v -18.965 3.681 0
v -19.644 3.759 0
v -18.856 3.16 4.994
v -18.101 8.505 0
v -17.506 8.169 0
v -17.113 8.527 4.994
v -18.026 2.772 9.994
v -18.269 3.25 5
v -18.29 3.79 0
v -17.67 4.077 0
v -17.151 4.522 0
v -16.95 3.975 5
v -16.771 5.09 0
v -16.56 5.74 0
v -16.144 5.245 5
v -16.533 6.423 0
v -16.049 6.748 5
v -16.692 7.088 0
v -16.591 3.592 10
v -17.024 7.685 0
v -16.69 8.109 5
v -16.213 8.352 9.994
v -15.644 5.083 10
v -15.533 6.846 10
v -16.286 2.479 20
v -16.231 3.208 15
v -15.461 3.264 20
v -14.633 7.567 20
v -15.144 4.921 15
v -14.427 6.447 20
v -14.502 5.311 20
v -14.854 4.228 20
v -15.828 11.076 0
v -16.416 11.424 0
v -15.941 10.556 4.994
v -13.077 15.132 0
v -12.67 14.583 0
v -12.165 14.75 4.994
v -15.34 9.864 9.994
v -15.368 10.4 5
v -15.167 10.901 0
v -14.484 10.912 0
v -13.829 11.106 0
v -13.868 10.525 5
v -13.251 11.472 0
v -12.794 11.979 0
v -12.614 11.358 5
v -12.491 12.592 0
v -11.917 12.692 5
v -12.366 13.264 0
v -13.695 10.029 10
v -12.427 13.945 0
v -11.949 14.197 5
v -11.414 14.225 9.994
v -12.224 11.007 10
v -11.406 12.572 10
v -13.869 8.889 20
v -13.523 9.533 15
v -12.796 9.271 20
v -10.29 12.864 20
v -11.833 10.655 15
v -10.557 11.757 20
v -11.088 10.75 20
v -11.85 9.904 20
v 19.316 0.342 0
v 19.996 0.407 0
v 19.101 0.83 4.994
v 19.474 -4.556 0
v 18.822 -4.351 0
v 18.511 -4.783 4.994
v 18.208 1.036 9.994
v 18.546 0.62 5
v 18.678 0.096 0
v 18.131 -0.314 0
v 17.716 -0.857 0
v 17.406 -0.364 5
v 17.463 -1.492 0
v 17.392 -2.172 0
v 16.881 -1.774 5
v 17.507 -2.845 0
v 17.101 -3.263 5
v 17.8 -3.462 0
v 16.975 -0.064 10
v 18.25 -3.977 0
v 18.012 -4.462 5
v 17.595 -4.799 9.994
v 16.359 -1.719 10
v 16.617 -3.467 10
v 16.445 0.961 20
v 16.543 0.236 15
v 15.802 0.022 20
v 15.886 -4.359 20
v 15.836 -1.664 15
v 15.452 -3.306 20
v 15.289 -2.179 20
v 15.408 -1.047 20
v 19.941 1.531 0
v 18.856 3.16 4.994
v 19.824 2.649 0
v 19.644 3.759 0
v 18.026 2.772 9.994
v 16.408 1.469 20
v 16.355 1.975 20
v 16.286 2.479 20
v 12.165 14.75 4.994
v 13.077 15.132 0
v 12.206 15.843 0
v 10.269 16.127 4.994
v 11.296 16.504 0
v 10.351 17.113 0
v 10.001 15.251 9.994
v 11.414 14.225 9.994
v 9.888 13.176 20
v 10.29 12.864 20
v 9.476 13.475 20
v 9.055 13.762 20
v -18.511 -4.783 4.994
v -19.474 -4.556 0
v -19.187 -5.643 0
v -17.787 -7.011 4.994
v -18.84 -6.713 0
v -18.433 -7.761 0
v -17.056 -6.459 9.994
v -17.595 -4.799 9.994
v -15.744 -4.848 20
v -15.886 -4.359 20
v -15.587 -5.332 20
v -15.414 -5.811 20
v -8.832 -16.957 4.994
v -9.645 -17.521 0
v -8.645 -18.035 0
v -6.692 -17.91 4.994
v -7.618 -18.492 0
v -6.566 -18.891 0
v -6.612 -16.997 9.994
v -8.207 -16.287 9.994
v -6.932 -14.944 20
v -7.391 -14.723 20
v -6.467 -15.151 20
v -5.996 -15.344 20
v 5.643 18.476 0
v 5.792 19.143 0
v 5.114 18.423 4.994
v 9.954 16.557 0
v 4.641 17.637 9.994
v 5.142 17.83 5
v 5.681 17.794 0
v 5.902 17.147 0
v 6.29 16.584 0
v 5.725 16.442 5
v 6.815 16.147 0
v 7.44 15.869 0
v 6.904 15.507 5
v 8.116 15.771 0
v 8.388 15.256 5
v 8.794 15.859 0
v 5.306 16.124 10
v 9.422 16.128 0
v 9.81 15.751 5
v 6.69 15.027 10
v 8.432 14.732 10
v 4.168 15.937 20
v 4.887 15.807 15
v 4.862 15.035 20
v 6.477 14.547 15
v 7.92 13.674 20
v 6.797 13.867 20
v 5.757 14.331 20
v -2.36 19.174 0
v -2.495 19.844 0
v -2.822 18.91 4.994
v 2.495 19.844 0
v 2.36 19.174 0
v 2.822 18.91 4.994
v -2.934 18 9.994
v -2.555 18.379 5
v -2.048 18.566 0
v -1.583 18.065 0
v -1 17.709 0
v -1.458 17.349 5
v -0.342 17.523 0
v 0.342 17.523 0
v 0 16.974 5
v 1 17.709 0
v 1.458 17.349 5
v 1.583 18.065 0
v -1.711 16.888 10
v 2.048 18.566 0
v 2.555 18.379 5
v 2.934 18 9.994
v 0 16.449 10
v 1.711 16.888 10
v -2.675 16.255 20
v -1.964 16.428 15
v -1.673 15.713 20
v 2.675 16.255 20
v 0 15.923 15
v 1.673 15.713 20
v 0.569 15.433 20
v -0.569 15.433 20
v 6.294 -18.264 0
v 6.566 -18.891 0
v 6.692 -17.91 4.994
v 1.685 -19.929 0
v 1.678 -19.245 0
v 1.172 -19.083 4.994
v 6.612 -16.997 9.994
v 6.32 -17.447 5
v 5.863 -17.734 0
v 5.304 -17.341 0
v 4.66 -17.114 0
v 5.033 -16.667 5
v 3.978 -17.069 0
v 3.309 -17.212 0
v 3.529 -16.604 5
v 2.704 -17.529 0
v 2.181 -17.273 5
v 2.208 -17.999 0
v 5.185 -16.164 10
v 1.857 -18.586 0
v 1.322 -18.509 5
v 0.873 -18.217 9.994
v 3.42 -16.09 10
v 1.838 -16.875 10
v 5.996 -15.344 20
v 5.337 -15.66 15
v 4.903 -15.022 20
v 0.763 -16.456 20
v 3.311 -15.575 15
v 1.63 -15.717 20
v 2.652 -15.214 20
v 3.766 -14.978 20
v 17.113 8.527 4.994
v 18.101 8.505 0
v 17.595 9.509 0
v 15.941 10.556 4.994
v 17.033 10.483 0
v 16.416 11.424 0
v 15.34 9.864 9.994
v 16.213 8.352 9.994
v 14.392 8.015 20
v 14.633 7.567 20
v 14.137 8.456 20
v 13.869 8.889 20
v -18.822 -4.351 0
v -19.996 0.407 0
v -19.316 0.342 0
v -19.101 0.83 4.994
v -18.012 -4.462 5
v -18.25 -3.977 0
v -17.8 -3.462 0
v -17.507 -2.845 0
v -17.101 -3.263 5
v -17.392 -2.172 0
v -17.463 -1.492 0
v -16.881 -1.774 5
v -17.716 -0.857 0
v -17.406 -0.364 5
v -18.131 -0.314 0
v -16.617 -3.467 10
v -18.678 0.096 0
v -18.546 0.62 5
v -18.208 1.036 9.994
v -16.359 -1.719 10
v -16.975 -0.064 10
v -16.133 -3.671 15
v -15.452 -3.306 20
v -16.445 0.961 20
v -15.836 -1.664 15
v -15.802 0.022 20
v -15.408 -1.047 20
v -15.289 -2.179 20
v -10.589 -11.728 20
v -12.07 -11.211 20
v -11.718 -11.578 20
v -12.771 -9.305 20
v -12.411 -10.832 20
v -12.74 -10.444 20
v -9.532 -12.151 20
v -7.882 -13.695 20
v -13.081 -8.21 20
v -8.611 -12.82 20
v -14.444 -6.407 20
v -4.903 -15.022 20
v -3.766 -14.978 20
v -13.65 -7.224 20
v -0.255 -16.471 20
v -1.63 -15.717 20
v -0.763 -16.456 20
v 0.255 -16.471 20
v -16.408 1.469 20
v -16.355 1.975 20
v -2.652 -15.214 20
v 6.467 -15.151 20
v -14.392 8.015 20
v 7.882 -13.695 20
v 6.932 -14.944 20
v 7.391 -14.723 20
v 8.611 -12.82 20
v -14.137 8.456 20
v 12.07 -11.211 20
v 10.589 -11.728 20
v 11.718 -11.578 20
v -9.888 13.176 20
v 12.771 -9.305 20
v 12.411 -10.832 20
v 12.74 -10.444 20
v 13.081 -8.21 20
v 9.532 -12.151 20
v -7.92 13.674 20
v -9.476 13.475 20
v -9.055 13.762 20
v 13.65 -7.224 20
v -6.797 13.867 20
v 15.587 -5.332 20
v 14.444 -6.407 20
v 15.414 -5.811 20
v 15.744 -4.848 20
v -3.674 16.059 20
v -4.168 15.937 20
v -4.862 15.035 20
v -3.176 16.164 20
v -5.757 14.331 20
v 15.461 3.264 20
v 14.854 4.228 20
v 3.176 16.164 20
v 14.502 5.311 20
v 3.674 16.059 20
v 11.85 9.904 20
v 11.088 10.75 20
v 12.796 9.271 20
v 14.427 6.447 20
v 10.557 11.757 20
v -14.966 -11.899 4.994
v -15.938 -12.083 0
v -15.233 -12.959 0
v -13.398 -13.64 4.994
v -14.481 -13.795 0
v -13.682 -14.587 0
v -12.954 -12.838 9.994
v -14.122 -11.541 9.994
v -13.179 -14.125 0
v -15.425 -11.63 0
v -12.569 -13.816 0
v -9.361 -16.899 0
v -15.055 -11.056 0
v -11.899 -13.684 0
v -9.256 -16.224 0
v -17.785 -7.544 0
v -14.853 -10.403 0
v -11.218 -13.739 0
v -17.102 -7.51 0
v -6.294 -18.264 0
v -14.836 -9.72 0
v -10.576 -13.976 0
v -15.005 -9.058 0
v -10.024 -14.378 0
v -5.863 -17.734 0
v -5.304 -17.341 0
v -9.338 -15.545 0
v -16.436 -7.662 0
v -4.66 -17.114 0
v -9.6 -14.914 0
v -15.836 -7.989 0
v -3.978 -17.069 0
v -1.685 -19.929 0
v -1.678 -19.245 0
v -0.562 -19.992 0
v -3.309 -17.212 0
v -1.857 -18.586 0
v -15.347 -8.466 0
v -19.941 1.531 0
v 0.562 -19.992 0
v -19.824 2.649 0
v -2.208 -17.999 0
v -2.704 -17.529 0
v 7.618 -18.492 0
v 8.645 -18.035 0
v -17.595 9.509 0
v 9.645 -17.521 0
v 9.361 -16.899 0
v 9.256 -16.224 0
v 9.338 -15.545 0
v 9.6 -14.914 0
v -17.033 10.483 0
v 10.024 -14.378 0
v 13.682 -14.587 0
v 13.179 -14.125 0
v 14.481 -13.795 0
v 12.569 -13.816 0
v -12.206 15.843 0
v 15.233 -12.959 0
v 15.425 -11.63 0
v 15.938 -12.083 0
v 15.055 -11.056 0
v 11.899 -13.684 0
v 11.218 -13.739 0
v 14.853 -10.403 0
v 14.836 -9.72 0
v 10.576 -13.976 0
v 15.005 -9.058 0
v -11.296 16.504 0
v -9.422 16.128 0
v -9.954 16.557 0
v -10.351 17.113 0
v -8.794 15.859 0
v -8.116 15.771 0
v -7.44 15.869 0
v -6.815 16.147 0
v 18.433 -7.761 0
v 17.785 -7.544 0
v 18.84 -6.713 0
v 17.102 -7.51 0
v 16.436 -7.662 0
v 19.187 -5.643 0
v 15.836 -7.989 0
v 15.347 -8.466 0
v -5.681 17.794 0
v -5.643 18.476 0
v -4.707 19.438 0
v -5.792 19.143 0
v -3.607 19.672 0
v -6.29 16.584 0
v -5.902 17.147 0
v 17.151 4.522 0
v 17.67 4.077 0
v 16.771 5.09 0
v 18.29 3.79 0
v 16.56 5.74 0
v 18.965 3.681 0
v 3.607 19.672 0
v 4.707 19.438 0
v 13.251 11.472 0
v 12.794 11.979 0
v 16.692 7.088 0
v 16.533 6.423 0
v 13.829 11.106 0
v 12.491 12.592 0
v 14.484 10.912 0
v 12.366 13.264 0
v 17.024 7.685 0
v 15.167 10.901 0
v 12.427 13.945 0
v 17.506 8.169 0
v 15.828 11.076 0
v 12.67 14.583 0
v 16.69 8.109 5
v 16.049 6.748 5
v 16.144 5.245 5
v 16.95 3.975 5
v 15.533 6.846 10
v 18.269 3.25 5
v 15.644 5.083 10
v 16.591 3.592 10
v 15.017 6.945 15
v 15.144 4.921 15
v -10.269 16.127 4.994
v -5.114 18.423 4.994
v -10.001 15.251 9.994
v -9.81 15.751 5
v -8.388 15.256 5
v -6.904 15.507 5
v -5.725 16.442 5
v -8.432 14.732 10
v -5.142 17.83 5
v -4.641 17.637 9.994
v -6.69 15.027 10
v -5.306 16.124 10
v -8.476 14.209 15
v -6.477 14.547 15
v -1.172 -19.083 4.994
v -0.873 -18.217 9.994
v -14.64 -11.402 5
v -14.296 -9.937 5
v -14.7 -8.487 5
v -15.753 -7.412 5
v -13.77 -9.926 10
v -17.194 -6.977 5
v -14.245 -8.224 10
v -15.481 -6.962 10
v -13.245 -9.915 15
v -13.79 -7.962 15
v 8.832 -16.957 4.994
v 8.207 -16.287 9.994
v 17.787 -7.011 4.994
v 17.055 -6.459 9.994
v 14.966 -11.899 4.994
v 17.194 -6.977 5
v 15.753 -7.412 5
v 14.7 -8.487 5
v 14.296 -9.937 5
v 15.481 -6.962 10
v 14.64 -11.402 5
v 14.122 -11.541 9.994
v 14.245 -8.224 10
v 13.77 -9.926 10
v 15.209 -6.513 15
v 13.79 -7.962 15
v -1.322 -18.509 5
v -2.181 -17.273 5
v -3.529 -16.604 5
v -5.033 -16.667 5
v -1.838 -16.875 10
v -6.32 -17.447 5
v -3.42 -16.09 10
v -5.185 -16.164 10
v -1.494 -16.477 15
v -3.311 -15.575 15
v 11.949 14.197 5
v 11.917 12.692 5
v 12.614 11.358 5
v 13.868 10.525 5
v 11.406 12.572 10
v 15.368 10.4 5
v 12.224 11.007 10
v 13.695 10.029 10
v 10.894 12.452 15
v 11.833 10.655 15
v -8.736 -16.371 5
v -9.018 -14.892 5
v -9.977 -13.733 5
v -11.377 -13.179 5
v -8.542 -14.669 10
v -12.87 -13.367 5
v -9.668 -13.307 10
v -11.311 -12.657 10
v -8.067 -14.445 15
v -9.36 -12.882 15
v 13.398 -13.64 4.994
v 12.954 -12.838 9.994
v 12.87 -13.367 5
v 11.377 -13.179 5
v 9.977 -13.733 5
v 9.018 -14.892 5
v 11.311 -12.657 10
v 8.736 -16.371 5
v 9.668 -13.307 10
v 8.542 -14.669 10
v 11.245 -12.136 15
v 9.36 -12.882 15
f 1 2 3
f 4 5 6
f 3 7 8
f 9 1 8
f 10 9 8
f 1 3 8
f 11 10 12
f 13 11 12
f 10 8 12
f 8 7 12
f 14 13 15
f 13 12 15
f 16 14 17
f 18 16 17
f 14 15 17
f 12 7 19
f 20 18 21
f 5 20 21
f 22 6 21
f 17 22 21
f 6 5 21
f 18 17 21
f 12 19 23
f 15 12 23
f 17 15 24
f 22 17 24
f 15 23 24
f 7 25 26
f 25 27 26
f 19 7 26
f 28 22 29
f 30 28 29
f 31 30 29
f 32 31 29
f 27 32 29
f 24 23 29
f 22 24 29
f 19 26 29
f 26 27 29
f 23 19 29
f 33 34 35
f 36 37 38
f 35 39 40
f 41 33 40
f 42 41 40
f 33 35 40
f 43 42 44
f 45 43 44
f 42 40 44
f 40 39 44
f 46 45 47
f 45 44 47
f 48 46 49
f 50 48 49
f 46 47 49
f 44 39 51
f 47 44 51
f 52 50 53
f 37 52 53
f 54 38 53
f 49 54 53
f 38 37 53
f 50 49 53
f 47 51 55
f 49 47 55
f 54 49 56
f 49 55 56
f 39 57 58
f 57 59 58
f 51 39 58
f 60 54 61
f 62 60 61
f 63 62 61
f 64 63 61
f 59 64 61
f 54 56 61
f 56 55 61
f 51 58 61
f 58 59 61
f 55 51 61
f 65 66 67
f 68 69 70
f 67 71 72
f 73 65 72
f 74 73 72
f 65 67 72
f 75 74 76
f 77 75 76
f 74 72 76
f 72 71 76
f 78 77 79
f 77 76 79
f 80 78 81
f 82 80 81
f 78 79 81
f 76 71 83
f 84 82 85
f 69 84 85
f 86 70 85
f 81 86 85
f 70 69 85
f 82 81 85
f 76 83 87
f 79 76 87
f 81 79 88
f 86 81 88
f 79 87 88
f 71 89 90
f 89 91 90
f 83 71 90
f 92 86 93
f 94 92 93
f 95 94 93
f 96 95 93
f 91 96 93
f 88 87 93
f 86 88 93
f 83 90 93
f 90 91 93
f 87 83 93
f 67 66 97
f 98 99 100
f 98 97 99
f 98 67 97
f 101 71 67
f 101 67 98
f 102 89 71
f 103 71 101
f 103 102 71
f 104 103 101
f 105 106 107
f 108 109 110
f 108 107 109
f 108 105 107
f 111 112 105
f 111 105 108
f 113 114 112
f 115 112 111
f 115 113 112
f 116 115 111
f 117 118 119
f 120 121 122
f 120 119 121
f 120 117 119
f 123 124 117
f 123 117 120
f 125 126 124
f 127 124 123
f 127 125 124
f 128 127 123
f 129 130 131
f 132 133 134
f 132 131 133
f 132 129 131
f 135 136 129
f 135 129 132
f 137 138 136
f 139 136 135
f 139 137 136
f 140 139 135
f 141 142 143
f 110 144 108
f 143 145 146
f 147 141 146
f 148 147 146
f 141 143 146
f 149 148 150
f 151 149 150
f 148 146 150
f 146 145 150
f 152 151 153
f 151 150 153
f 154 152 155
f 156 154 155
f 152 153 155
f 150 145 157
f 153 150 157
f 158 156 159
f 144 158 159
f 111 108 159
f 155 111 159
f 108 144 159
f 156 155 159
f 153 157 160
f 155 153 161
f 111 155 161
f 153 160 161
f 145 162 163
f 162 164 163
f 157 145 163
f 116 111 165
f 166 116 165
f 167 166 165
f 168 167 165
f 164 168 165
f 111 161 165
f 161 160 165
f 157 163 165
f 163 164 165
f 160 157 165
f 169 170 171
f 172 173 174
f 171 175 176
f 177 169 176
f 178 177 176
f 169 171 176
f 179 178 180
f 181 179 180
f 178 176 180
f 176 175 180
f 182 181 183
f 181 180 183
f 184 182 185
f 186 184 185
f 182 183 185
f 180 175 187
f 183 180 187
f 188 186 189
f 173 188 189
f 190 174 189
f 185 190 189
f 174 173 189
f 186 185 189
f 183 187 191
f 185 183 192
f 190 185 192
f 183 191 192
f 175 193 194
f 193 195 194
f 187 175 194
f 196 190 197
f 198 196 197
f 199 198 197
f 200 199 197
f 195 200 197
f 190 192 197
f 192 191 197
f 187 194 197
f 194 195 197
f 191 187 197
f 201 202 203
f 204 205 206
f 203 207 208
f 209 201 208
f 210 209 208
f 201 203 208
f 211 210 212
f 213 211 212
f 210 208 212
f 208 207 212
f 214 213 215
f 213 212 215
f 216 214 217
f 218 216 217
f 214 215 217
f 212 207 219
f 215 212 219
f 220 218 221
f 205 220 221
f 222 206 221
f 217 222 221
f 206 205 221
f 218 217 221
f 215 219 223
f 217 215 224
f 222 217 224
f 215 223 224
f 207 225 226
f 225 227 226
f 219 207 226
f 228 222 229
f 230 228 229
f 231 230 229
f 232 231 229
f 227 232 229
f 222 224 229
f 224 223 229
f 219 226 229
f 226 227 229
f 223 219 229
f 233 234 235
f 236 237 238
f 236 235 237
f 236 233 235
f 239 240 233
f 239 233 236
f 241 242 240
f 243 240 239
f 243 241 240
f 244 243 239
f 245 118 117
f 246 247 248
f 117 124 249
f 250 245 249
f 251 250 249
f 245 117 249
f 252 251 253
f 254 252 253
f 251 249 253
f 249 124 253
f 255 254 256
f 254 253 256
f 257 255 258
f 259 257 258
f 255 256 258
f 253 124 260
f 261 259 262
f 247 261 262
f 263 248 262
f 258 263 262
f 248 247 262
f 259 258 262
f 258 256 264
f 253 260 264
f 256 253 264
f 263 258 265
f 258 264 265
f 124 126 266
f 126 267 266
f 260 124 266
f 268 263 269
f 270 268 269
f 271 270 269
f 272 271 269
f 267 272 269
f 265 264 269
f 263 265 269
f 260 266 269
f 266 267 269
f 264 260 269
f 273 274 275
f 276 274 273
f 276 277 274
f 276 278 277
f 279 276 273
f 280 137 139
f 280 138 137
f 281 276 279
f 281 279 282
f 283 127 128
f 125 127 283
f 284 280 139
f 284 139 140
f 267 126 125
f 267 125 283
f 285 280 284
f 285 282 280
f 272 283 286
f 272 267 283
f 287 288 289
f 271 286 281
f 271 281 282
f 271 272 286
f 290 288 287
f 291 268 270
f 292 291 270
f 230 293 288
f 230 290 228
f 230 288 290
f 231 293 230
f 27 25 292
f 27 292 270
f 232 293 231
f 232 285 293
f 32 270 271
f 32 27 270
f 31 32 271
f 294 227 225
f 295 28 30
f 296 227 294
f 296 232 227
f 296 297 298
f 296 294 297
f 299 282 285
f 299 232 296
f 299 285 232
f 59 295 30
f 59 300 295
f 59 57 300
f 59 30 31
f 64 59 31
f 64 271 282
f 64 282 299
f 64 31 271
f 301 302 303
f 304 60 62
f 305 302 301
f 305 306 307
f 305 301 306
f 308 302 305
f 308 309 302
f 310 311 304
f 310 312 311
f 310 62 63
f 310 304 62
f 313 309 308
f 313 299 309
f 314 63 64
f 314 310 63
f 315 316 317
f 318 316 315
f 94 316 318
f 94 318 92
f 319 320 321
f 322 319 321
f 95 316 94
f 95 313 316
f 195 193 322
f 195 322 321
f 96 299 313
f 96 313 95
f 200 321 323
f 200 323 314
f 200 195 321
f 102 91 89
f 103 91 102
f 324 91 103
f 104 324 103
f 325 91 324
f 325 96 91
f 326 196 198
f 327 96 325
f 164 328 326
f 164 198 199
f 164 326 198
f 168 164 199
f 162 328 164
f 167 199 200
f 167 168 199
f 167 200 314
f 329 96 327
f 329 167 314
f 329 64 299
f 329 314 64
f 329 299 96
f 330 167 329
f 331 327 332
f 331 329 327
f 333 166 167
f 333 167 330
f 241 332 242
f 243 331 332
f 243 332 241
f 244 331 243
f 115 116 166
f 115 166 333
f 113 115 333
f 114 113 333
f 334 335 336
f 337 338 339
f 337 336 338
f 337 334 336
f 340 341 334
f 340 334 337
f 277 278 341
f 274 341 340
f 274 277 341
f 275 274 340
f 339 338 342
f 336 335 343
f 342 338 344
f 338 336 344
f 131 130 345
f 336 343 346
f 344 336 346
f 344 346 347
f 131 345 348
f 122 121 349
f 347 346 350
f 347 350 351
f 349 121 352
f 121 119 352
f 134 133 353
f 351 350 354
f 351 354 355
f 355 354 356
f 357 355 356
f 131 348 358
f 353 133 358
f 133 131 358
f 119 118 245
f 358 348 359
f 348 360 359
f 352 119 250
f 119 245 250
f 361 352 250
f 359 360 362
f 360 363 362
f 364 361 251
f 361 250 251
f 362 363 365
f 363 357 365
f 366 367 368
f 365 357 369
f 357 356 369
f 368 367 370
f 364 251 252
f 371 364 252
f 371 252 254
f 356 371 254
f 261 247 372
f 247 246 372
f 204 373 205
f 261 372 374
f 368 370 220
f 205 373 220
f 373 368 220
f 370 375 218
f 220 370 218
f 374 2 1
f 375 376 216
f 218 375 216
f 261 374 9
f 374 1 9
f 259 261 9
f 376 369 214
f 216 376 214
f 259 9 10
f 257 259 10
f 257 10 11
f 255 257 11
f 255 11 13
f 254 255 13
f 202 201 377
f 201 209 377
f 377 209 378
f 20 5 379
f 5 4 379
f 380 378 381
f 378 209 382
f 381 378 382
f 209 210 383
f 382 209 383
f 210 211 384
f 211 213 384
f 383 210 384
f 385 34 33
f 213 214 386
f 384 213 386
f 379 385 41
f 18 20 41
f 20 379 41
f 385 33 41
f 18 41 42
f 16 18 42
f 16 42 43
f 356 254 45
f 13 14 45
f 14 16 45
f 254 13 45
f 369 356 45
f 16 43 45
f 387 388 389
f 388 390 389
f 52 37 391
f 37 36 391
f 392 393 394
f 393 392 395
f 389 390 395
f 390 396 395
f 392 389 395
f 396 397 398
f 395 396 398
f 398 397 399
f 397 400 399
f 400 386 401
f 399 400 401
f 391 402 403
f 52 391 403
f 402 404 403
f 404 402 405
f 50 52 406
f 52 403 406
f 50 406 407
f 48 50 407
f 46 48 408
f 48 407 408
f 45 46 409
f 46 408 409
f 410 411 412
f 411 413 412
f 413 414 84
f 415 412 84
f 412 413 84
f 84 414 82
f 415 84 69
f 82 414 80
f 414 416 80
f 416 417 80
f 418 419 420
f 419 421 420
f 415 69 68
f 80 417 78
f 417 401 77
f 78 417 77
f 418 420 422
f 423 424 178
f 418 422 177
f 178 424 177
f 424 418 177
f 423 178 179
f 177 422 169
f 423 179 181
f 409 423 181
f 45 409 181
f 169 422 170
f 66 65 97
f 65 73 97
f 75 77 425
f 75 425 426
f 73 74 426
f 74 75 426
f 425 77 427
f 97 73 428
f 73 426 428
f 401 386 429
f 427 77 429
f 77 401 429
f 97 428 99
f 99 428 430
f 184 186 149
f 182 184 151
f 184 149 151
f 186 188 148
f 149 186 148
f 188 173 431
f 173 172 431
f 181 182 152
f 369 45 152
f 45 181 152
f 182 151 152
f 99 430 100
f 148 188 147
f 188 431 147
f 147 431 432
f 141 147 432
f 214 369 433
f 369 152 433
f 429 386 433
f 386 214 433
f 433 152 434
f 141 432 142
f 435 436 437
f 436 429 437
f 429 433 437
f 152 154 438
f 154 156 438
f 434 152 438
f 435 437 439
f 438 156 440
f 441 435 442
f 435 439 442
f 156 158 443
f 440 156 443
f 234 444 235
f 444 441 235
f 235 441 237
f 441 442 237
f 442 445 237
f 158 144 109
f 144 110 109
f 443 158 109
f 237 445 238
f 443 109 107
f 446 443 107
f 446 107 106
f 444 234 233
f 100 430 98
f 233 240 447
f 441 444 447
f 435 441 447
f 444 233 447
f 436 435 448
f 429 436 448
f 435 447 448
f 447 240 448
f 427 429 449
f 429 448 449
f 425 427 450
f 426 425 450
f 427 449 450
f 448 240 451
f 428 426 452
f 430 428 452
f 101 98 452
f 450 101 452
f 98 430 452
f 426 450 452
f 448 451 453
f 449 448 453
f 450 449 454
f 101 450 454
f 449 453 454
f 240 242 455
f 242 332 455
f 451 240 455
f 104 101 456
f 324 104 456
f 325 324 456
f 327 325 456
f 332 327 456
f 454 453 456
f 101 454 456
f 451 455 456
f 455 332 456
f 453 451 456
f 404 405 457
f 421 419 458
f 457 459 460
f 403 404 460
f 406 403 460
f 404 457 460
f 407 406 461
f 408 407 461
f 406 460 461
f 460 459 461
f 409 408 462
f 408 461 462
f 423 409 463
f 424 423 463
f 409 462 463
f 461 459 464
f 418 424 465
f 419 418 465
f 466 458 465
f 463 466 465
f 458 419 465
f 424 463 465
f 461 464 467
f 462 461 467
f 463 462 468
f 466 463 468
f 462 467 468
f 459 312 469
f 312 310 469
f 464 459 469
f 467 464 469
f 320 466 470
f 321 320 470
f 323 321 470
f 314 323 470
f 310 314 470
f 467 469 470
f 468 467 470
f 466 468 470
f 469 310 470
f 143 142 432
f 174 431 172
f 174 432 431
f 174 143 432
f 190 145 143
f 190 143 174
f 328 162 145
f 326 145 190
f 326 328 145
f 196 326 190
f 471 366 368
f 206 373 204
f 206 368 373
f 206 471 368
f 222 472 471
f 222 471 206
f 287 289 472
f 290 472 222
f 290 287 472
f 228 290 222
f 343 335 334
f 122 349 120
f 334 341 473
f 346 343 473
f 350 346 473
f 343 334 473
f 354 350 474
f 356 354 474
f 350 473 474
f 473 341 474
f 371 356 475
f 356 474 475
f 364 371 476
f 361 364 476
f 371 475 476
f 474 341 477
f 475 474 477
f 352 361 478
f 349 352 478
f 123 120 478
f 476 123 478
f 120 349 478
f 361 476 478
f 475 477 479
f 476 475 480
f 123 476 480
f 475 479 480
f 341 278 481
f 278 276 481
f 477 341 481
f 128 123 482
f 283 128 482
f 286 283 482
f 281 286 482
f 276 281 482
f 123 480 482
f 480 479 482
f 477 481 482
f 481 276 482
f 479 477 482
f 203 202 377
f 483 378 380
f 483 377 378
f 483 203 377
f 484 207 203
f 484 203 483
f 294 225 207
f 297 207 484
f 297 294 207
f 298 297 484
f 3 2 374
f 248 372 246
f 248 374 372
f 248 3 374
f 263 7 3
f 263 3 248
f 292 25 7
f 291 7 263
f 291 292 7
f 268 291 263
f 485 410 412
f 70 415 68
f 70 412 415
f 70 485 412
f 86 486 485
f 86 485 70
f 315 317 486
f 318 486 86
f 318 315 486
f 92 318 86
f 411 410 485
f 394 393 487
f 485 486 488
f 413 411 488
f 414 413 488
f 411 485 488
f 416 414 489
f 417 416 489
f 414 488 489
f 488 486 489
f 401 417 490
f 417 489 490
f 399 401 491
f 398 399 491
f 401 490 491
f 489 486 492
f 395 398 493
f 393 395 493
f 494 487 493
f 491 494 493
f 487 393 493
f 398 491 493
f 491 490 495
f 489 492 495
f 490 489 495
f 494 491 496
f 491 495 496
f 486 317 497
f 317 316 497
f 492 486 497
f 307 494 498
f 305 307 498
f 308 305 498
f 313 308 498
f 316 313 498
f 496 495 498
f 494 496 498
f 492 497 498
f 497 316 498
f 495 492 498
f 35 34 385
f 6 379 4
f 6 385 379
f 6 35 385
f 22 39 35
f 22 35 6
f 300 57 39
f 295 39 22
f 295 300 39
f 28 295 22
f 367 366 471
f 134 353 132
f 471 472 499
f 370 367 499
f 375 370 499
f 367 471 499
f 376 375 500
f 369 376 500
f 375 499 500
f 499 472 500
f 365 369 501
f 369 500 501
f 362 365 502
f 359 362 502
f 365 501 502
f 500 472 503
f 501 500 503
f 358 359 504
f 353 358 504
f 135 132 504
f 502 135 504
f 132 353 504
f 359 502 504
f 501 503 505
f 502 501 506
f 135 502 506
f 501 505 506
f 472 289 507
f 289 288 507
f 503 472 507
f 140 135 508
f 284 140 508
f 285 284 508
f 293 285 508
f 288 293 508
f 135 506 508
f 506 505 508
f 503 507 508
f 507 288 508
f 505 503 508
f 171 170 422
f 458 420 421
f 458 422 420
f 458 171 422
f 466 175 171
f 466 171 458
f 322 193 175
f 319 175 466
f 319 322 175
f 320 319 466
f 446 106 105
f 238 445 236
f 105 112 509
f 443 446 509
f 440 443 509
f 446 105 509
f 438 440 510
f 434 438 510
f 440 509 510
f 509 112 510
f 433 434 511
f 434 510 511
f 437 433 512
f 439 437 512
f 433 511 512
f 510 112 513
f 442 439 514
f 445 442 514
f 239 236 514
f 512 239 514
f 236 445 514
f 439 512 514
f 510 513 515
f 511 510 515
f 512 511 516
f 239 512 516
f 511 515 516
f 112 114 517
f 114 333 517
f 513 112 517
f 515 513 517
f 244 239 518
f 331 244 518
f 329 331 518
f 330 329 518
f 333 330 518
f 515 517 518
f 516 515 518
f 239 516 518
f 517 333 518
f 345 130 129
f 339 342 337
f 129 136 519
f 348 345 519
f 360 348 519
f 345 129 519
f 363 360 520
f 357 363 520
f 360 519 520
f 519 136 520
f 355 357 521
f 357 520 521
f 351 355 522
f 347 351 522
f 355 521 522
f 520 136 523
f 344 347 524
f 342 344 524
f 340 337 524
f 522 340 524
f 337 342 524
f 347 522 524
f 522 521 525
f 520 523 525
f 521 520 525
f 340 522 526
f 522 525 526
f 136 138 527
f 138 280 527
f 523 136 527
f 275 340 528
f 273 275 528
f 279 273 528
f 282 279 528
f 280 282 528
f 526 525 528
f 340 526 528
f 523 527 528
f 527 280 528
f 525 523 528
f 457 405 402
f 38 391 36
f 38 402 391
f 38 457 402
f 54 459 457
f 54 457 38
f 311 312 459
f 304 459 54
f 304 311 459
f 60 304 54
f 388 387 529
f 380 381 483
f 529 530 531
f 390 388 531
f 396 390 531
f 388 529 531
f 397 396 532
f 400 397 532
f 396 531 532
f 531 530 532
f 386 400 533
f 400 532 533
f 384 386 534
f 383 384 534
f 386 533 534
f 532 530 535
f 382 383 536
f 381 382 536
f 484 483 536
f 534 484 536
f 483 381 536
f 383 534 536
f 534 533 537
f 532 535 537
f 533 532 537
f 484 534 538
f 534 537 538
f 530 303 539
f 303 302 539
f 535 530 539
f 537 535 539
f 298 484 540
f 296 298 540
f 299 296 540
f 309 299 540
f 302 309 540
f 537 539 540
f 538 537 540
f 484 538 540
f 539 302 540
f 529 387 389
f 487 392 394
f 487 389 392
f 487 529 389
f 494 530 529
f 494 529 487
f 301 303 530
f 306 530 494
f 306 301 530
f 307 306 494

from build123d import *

# Parameters (mm, degrees)
SKETCH_R           = 20
PAD_DEPTH          = 20
PAD_TAPER          = 10
SKETCH001_R        = 2.5
POCKET_DEPTH       = 20
POCKET_TAPER       = -6
POLARPATTERN_COUNT = 15


with BuildPart() as part:
    # Sketch → Pad (new body)
    with BuildSketch(Plane.XY):
        Circle(SKETCH_R)
    extrude(amount=PAD_DEPTH, taper=PAD_TAPER)

    # Sketch001 → Pocket (cut)
    with BuildSketch(Plane.XY):
        with Locations((0, 20)):
            Circle(SKETCH001_R)
    pocket = extrude(amount=POCKET_DEPTH, taper=POCKET_TAPER, mode=Mode.SUBTRACT)

    # PolarPattern: Pocket ×15 about axis
    polarpattern_axis = Axis((0, 0, 0), (0, 0, 1))
    for i in range(1, POLARPATTERN_COUNT):
        add(pocket.rotate(polarpattern_axis, i * 360 / POLARPATTERN_COUNT), mode=Mode.SUBTRACT)


solid = part.part
